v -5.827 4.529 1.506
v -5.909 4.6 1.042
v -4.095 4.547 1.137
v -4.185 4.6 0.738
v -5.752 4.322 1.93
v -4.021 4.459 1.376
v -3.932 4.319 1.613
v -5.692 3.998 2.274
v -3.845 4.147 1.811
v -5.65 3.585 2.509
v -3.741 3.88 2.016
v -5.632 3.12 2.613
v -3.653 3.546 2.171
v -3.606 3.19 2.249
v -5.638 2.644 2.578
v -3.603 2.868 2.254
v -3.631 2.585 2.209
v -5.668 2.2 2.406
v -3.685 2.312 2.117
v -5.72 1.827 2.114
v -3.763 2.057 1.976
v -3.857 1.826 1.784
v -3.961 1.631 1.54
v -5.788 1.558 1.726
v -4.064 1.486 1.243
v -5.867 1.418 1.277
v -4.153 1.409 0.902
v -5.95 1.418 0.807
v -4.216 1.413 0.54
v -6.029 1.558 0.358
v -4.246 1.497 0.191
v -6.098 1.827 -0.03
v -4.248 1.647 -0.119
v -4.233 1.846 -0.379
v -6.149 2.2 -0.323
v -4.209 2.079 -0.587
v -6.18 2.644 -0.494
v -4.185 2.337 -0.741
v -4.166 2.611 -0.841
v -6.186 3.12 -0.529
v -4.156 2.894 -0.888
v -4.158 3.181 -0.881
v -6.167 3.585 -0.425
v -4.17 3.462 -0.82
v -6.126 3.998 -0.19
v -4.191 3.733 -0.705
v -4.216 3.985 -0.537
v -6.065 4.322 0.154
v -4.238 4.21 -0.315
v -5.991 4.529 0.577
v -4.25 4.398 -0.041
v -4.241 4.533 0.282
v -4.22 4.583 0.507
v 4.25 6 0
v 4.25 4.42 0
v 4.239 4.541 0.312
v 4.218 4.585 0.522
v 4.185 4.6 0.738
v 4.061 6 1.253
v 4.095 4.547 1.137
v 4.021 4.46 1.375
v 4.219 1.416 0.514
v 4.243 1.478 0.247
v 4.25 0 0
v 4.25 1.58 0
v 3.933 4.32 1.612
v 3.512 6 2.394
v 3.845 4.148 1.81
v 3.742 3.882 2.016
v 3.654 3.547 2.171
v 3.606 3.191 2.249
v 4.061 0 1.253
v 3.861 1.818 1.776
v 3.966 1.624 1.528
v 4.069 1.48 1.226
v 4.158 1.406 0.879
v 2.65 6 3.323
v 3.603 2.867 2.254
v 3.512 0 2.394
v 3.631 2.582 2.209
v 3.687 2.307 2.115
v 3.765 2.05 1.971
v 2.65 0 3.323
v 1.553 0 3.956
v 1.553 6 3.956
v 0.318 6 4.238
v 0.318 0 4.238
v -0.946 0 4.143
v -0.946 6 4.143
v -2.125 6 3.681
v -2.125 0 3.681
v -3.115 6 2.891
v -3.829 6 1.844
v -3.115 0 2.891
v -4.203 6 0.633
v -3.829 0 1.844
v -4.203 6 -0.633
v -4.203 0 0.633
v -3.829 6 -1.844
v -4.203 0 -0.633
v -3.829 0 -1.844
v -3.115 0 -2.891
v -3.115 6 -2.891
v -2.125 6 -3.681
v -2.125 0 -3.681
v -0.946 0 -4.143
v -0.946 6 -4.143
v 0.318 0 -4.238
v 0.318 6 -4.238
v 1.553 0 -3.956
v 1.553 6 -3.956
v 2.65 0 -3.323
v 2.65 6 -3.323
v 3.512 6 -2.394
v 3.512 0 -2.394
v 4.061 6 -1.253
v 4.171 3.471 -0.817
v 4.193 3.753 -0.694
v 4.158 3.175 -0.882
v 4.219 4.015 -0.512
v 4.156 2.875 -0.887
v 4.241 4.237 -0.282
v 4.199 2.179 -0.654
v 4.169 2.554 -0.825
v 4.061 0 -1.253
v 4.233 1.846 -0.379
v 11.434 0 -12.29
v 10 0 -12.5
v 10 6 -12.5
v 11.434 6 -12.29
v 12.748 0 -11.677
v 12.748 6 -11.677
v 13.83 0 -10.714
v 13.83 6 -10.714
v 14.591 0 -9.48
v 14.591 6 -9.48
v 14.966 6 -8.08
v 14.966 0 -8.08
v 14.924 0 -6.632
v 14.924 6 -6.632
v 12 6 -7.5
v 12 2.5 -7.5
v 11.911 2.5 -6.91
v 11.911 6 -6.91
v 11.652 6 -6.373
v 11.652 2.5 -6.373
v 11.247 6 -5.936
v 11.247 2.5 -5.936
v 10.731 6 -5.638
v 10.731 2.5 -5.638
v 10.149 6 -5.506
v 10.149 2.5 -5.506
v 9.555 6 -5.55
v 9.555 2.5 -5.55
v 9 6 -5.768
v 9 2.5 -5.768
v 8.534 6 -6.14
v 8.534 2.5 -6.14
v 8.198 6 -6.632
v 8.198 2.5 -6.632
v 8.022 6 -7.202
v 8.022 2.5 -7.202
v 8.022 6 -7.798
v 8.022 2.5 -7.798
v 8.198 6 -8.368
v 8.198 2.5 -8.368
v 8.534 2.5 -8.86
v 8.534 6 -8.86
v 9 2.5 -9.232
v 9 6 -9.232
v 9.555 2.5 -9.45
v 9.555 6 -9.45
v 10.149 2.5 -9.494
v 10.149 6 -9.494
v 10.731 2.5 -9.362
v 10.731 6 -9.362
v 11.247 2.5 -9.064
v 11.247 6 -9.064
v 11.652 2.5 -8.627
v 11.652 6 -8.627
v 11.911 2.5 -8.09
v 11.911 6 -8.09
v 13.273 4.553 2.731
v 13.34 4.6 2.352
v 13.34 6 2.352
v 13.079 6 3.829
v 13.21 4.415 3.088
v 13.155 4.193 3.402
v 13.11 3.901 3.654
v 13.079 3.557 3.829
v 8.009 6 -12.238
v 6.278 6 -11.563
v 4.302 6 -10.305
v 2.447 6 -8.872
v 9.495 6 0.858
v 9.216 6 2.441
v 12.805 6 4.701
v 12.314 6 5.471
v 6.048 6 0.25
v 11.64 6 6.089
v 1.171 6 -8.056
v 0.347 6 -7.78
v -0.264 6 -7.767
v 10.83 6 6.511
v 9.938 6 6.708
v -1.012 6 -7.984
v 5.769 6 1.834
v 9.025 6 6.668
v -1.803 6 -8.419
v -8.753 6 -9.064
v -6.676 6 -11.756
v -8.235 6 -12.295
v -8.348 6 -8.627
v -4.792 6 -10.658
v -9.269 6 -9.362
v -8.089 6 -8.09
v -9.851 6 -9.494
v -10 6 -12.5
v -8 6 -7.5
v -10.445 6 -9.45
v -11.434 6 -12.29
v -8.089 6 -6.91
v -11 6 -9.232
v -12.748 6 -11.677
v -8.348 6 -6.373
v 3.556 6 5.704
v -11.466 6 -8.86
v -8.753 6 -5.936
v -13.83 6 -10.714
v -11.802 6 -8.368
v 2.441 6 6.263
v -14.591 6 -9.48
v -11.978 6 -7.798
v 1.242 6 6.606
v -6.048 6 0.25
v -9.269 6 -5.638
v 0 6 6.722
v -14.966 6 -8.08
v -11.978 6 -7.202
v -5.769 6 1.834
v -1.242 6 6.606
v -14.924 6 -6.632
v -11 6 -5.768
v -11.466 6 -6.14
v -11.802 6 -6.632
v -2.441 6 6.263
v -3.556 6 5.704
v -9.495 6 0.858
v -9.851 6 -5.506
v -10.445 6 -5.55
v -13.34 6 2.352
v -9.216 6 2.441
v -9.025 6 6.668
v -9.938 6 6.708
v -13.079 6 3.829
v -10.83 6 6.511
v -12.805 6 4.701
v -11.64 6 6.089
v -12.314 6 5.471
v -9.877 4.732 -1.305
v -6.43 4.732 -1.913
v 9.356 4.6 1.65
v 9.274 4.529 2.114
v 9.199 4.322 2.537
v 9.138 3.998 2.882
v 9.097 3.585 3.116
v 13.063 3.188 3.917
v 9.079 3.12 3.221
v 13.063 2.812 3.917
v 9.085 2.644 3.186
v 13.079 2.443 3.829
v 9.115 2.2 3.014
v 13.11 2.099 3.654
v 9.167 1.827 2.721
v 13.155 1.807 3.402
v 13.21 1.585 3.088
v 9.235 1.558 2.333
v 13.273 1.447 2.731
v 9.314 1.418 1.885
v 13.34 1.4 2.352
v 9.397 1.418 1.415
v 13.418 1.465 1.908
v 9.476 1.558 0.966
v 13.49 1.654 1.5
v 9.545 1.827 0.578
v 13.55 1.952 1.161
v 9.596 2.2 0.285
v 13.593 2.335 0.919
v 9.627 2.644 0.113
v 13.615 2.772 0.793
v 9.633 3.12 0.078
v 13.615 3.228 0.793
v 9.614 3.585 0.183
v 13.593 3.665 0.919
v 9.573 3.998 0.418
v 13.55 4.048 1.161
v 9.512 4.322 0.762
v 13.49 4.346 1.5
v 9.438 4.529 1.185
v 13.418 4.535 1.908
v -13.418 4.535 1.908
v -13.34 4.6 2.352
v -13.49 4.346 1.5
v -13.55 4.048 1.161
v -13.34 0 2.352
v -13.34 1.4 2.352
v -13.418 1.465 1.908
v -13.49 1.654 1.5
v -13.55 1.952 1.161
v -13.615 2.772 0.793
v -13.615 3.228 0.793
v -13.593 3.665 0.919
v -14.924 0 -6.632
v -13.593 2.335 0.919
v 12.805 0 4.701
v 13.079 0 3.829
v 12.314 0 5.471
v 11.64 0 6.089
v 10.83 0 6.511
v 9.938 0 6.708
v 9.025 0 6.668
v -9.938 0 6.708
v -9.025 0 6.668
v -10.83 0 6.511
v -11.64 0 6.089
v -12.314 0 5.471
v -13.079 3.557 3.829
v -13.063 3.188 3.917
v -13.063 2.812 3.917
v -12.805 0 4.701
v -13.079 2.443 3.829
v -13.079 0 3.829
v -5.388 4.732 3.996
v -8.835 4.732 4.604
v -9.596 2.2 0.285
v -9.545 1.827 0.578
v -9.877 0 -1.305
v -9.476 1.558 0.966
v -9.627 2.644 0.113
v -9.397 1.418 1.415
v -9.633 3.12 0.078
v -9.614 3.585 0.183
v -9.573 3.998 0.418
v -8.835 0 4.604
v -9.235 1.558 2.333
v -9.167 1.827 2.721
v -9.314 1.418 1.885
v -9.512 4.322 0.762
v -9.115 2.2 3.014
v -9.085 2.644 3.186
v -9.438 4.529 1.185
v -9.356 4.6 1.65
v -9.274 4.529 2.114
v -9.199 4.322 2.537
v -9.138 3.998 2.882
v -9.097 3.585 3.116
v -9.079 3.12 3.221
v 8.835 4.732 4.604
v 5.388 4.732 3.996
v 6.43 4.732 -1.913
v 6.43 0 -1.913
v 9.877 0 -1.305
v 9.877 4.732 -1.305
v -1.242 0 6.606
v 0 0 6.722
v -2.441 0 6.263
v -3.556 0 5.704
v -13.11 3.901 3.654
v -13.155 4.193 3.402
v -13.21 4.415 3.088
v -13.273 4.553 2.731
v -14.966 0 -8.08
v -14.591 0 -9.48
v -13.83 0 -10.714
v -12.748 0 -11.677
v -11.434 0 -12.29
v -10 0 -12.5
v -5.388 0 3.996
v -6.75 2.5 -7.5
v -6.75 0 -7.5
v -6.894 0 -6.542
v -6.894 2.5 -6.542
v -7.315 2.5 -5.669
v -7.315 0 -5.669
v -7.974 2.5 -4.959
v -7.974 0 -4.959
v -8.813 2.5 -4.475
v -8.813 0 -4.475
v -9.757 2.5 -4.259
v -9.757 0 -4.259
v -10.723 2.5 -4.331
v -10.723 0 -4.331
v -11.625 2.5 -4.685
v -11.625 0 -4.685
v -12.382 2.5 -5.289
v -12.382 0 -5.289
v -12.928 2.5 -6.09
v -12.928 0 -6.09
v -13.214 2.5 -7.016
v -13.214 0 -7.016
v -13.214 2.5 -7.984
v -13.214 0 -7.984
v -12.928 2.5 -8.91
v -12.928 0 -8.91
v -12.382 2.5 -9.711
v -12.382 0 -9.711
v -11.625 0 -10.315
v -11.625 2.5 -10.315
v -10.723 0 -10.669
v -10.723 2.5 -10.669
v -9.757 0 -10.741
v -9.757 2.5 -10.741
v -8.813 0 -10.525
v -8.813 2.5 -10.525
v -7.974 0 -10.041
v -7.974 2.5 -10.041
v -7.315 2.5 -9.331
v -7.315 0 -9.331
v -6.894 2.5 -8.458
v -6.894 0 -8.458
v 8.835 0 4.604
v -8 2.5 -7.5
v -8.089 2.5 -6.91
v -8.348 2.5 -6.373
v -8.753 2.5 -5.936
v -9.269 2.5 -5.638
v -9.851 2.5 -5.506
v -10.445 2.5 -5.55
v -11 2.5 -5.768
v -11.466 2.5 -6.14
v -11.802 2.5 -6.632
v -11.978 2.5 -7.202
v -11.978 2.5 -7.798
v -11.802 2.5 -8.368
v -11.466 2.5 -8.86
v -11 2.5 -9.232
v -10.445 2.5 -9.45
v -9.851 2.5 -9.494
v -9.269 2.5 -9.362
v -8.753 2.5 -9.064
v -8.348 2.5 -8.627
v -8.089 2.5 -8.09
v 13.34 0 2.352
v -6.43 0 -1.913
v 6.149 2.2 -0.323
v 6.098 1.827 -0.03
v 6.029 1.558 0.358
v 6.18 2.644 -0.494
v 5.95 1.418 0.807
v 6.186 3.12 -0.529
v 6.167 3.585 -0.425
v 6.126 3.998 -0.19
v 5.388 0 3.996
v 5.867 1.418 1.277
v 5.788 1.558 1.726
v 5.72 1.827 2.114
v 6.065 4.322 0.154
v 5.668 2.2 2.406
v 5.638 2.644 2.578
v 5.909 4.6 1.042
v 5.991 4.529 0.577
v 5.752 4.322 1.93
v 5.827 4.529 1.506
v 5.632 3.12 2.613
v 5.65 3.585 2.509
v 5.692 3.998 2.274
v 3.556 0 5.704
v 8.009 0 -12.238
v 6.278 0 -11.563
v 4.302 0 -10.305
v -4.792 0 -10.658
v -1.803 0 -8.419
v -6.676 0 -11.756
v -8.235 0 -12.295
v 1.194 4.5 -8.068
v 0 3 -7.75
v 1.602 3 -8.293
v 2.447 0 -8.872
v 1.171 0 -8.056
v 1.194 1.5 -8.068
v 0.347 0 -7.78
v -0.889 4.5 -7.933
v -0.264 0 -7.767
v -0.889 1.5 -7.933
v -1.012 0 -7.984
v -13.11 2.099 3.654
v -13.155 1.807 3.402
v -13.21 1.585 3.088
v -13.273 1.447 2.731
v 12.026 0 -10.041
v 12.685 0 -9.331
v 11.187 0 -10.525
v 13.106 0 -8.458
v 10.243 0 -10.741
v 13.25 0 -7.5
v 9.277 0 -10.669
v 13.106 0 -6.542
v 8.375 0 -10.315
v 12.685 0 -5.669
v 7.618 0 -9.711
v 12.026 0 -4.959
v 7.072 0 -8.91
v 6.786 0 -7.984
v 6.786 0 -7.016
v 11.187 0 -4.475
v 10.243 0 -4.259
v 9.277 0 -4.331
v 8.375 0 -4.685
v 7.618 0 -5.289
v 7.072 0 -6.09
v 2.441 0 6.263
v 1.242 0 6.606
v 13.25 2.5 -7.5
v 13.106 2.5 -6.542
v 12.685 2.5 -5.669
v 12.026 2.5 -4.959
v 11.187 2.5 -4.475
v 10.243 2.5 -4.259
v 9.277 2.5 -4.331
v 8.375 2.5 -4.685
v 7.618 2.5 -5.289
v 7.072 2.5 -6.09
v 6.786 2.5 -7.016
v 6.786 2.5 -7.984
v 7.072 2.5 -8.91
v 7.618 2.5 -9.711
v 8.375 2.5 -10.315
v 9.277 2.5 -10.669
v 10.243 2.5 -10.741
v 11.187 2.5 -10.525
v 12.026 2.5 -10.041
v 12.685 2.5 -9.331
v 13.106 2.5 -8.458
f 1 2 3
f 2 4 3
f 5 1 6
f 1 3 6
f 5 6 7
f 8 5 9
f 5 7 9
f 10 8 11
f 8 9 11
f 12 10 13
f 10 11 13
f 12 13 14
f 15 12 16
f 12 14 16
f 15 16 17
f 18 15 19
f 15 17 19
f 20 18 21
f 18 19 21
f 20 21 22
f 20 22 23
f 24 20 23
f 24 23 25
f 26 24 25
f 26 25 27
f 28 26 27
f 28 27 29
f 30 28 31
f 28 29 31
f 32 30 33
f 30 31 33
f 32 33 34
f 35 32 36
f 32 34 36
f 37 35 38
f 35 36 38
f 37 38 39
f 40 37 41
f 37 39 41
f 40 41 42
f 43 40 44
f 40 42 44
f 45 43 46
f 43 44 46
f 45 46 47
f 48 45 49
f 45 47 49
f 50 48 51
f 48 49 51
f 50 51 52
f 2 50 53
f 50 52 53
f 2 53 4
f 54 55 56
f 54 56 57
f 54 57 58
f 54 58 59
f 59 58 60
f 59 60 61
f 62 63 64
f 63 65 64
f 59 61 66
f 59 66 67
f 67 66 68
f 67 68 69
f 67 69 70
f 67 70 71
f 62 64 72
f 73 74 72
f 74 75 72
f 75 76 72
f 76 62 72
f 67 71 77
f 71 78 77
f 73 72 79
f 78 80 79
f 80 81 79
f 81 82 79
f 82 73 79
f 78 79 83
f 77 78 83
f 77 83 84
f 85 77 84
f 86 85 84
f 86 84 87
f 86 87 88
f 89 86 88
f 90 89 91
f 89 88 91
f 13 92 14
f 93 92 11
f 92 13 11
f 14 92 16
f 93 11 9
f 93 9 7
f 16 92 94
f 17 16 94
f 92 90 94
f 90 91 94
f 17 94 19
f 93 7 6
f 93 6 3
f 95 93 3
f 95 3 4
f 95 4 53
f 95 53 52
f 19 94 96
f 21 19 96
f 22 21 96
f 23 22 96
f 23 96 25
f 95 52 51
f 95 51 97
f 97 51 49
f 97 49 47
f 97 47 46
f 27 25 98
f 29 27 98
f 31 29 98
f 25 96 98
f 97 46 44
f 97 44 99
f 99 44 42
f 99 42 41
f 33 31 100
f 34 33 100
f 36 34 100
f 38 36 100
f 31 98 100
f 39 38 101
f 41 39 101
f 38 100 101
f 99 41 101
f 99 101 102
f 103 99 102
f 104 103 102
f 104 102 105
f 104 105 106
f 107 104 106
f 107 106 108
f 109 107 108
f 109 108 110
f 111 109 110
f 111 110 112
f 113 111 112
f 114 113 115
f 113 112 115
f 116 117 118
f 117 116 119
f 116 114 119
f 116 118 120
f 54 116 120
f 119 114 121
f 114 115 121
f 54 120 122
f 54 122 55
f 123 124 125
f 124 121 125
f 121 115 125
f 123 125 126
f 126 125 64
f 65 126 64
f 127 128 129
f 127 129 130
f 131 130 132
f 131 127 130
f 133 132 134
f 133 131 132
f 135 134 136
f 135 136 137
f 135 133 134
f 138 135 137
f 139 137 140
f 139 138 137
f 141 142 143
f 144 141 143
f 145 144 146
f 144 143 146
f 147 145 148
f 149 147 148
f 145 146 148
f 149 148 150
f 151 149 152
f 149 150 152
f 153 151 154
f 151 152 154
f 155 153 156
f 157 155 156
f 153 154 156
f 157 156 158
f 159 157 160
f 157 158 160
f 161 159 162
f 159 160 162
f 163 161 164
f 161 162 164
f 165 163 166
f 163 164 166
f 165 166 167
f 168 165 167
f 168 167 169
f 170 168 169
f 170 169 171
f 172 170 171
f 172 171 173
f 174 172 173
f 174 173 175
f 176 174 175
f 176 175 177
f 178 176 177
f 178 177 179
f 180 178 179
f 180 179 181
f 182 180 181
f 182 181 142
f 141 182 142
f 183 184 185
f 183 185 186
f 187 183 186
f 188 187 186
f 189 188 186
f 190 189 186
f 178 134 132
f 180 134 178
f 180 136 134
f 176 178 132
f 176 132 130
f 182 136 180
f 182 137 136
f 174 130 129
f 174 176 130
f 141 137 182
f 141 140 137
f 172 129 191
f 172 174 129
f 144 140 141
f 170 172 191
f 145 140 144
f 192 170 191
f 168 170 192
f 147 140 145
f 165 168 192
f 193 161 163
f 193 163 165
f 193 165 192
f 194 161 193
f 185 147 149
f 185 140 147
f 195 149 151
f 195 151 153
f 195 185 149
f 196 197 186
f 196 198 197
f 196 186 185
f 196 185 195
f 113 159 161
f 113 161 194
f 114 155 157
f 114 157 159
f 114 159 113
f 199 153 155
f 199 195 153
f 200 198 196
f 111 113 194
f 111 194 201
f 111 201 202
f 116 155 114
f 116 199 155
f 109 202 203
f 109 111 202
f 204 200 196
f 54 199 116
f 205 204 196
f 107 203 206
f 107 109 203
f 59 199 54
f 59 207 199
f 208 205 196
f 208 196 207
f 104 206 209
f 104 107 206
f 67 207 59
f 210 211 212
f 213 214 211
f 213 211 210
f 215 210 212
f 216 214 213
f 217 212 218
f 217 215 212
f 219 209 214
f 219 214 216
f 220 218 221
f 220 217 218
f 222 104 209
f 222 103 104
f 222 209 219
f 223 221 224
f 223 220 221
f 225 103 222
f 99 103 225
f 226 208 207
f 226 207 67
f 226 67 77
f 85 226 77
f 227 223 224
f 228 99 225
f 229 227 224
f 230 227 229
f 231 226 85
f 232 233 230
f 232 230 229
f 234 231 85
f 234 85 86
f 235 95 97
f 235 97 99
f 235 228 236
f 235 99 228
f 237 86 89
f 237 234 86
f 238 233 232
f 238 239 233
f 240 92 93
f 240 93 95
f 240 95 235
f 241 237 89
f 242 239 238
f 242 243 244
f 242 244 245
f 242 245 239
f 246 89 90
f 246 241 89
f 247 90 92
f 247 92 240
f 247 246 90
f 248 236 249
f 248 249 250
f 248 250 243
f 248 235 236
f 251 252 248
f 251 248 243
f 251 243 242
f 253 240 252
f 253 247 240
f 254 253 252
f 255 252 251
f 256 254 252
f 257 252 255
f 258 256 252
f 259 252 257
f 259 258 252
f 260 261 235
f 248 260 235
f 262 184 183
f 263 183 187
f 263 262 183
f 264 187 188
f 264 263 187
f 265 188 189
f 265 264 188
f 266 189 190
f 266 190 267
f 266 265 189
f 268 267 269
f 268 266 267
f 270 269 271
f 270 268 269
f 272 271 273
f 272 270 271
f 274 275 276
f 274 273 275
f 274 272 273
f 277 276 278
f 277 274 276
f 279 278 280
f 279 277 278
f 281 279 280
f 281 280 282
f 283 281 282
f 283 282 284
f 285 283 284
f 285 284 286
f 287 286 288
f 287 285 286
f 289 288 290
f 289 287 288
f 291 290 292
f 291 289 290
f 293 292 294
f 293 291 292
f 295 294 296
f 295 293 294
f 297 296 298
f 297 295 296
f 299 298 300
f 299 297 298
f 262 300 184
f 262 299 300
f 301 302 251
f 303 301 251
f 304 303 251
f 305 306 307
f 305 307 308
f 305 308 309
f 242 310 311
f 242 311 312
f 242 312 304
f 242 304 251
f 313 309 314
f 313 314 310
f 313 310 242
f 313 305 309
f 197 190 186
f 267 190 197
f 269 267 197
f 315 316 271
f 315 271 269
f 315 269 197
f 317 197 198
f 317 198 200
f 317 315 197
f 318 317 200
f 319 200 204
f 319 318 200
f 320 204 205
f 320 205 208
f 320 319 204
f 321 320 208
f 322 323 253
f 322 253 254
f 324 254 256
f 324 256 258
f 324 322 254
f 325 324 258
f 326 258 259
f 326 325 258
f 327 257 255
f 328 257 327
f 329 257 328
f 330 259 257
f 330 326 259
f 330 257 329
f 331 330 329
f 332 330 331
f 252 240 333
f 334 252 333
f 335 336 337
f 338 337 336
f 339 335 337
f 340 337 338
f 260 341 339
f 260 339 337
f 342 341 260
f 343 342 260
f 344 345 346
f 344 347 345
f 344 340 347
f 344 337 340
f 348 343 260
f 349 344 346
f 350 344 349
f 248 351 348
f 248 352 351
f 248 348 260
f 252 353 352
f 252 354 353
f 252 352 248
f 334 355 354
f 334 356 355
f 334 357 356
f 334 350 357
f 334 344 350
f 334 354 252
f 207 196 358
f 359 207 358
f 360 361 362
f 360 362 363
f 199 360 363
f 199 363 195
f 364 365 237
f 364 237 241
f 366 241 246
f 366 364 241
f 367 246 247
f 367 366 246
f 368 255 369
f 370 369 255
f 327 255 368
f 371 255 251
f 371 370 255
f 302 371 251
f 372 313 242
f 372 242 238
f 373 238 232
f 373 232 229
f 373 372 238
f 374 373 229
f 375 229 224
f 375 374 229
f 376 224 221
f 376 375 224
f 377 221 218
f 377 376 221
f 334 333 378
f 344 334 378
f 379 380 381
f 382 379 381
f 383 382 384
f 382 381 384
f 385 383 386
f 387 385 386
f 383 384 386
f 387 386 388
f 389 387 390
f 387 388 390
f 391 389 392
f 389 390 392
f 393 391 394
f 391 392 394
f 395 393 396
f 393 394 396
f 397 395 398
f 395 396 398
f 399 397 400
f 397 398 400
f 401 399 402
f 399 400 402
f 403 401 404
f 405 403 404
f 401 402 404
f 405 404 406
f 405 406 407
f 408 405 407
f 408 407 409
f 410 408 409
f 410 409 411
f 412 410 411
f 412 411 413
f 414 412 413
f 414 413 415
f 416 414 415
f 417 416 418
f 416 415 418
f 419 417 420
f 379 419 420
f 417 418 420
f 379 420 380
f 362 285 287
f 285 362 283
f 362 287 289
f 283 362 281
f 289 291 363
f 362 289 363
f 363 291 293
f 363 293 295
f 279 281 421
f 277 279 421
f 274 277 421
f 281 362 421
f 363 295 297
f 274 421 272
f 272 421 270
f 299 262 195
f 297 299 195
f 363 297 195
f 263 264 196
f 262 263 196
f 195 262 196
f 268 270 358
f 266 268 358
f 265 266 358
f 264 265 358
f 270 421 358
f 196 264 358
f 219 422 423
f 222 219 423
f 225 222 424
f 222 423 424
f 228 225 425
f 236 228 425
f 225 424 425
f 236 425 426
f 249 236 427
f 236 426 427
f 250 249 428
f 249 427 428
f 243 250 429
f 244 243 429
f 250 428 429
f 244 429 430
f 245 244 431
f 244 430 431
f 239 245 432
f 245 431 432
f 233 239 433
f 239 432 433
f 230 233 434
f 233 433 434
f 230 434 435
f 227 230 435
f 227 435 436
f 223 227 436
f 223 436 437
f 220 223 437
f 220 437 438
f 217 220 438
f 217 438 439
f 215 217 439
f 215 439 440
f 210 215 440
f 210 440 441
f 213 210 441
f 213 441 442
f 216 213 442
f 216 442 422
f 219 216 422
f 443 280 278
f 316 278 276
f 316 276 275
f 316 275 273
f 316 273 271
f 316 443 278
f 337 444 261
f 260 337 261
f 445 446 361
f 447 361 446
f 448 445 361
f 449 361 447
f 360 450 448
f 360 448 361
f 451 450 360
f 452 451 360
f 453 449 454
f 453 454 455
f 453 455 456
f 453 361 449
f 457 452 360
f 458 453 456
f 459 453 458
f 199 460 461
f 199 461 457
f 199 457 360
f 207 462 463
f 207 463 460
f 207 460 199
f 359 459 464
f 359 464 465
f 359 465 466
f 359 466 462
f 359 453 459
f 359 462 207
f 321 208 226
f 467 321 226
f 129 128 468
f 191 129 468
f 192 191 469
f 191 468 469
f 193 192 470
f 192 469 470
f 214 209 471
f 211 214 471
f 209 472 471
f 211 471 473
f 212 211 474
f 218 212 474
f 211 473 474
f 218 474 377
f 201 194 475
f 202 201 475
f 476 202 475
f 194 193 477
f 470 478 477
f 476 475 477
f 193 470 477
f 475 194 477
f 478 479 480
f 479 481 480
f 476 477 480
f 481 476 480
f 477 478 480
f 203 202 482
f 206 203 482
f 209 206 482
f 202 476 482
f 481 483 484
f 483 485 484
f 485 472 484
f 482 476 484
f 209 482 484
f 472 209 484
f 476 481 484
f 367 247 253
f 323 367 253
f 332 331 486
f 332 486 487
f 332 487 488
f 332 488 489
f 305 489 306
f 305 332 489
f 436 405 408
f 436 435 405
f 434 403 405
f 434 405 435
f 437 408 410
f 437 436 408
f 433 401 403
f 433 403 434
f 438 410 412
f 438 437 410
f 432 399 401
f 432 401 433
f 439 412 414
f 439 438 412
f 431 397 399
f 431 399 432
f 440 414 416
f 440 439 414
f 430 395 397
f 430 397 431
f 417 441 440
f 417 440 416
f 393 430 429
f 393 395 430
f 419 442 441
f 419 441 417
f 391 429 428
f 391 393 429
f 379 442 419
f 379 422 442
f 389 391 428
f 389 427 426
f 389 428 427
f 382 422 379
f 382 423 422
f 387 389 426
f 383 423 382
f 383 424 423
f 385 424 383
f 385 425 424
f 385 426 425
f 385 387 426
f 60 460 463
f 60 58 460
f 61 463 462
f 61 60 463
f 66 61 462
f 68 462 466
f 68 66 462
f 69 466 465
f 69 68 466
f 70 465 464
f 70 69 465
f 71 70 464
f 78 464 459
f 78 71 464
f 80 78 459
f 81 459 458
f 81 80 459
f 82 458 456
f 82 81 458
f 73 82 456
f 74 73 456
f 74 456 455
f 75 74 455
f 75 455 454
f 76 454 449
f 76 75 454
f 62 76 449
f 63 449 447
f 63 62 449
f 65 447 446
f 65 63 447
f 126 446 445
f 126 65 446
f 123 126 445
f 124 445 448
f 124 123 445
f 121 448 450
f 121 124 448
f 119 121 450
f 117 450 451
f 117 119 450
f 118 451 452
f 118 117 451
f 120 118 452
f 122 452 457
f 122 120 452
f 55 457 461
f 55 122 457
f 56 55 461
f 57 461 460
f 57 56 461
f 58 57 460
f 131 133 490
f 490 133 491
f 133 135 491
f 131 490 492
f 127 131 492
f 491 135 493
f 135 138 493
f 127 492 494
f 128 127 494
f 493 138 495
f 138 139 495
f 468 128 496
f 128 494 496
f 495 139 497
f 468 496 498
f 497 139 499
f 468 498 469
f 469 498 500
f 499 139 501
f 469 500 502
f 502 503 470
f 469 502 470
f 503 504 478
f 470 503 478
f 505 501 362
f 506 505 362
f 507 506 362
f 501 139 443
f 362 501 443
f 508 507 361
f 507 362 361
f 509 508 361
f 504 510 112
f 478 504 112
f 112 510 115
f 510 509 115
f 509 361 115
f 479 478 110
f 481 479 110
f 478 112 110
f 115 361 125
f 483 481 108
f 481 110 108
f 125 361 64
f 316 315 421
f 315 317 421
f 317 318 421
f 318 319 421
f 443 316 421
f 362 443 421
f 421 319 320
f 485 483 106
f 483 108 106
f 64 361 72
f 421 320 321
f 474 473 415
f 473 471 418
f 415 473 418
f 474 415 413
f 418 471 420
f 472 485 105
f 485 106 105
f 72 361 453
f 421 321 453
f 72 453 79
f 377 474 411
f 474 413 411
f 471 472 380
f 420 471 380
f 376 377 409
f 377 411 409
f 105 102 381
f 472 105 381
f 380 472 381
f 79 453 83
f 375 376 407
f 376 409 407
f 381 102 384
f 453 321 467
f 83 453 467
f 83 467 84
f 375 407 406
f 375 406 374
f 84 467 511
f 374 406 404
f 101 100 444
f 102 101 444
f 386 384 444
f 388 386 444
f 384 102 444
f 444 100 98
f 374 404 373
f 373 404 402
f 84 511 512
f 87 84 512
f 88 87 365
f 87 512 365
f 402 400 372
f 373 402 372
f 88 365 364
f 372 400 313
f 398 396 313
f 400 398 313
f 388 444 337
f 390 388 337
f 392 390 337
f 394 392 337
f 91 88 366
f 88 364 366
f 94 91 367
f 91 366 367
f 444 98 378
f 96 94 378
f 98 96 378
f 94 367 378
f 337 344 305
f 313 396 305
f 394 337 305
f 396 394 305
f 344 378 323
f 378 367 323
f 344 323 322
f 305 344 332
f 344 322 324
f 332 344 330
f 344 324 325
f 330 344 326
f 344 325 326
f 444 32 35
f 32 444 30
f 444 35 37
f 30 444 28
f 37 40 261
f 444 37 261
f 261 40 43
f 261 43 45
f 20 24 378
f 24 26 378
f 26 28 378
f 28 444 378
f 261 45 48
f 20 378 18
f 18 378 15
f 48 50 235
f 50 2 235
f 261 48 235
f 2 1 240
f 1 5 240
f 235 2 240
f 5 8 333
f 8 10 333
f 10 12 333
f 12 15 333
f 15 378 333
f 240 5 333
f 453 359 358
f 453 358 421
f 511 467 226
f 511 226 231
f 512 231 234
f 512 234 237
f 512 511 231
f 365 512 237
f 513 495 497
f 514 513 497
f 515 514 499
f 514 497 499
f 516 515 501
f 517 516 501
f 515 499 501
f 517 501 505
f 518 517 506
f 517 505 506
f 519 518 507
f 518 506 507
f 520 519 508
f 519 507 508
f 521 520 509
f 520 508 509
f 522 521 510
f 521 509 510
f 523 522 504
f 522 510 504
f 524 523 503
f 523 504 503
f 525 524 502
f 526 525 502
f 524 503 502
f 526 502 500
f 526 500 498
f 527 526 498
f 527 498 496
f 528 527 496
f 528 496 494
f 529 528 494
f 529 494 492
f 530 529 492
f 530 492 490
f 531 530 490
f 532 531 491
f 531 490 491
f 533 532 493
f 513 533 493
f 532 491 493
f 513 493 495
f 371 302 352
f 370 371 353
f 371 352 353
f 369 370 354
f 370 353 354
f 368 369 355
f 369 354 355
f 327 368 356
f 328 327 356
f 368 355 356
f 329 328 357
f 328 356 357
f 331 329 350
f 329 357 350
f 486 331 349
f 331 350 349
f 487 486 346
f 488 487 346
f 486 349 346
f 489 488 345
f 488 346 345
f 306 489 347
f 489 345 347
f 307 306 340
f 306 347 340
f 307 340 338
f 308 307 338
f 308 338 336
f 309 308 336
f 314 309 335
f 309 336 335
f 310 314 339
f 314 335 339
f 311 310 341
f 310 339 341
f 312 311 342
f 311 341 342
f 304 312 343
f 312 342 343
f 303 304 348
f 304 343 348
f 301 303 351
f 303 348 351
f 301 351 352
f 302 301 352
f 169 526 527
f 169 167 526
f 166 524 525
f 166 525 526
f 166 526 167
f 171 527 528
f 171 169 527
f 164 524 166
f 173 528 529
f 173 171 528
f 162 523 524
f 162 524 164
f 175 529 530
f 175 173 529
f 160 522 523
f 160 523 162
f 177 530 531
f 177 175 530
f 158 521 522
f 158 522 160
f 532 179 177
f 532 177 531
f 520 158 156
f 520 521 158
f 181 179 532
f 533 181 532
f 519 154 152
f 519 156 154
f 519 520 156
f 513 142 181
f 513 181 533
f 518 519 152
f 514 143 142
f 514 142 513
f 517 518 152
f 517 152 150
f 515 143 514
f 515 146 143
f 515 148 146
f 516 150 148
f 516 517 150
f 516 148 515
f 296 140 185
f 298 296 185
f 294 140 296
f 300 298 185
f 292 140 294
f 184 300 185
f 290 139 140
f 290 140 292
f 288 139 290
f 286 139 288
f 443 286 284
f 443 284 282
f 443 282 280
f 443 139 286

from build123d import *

# Parameters (mm, degrees)
F0_R      = 2
F0_R_2    = 4.25
F1_DEPTH  = 6
F4_R      = 1.6
F5_DEPTH  = 15
F8_DEPTH  = 3.5
F11_R     = 3.25
F12_DEPTH = 2.5


with BuildPart() as f1:
    # F0 (on Front) → F1 (new body)
    with BuildSketch(Plane.XZ):
        with BuildLine():
            add(Edge.make_bspline(
                [(10, -12.5), (5, -12.5), (0, -3), (-5, -12.5), (-10, -12.5)],
                knots=[0, 0, 0, 0, 0.5, 1, 1, 1, 1], degree=3))
            ThreePointArc((10, -12.5), (13.8302222156, -10.7139380484), (14.9240387651, -6.6317591117))
            Line((14.9240387651, -6.6317591117), (13.3399263315, 2.3521889329))
            Line((13.3399263315, 2.3521889329), (13.079454065, 3.8294005624))
            ThreePointArc((13.079454065, 3.8294005624), (11.6401444567, 6.0886640956), (9.0248583076, 6.6684590761))
            Line((9.0248583076, 6.6684590761), (3.5557645771, 5.7041102914))
            ThreePointArc((3.5557645771, 5.7041102914), (1.8492439019, 6.4622467406), (0, 6.7216319406))
            ThreePointArc((0, 6.7216319406), (-1.8492439019, 6.4622467406), (-3.5557645771, 5.7041102914))
            Line((-3.5557645771, 5.7041102914), (-9.0248583076, 6.6684590761))
            ThreePointArc((-9.0248583076, 6.6684590761), (-11.6401444567, 6.0886640956), (-13.079454065, 3.8294005624))
            Line((-13.079454065, 3.8294005624), (-13.3399263315, 2.3521889329))
            Line((-13.3399263315, 2.3521889329), (-14.9240387651, -6.6317591117))
            ThreePointArc((-14.9240387651, -6.6317591117), (-13.8302222156, -10.7139380484), (-10, -12.5))
        make_face()
        with Locations((-10, -7.5)):
            Circle(F0_R, mode=Mode.SUBTRACT)
        with Locations((10, -7.5)):
            Circle(F0_R, mode=Mode.SUBTRACT)
        Circle(F0_R_2, mode=Mode.SUBTRACT)
    extrude(amount=-F1_DEPTH)


with BuildPart() as f5:
    # F4 (on line) → F5 (new body)
    with BuildSketch(Plane(origin=(0, 0, 0), x_dir=(0, 1, 0), z_dir=(0.984807753, 0, 0.1736481777))):
        with Locations((3, 0)):
            Circle(F4_R)
    extrude(amount=F5_DEPTH)


with BuildPart() as f8:
    # F7 (on offset) → F8 (new body)
    with BuildSketch(Plane(origin=(5.9088465181, 0, 1.041889066), x_dir=(0, 1, 0), z_dir=(0.984807753, 0, 0.1736481777))):
        Polygon((1.2679491924, -3), (4.7320508076, -3), (6.4641016151, 0), (4.7320508076, 3), (1.2679491924, 3), (-12.080499812, 3), (-12.080499812, -3), align=None)
    extrude(amount=F8_DEPTH)


with BuildPart() as f9_1:
    # F9: instance of F5
    add(f5.part.mirror(Plane.YZ))


with BuildPart() as f9_2:
    # F9: instance of F8
    add(f8.part.mirror(Plane.YZ))


with BuildPart() as f1_1:
    add(f1.part)

    # F10: cut F8, F5, F9_1, F9_2
    add(f8.part, mode=Mode.SUBTRACT)
    add(f5.part, mode=Mode.SUBTRACT)
    add(f9_1.part, mode=Mode.SUBTRACT)
    add(f9_2.part, mode=Mode.SUBTRACT)

    # F11 (on face) → F12 (cut)
    with BuildSketch(Plane.XZ):
        with Locations((-10, -7.5)):
            Circle(F11_R)
        with Locations((10, -7.5)):
            Circle(F11_R)
    extrude(amount=-F12_DEPTH, mode=Mode.SUBTRACT)


solid = f1_1.part
